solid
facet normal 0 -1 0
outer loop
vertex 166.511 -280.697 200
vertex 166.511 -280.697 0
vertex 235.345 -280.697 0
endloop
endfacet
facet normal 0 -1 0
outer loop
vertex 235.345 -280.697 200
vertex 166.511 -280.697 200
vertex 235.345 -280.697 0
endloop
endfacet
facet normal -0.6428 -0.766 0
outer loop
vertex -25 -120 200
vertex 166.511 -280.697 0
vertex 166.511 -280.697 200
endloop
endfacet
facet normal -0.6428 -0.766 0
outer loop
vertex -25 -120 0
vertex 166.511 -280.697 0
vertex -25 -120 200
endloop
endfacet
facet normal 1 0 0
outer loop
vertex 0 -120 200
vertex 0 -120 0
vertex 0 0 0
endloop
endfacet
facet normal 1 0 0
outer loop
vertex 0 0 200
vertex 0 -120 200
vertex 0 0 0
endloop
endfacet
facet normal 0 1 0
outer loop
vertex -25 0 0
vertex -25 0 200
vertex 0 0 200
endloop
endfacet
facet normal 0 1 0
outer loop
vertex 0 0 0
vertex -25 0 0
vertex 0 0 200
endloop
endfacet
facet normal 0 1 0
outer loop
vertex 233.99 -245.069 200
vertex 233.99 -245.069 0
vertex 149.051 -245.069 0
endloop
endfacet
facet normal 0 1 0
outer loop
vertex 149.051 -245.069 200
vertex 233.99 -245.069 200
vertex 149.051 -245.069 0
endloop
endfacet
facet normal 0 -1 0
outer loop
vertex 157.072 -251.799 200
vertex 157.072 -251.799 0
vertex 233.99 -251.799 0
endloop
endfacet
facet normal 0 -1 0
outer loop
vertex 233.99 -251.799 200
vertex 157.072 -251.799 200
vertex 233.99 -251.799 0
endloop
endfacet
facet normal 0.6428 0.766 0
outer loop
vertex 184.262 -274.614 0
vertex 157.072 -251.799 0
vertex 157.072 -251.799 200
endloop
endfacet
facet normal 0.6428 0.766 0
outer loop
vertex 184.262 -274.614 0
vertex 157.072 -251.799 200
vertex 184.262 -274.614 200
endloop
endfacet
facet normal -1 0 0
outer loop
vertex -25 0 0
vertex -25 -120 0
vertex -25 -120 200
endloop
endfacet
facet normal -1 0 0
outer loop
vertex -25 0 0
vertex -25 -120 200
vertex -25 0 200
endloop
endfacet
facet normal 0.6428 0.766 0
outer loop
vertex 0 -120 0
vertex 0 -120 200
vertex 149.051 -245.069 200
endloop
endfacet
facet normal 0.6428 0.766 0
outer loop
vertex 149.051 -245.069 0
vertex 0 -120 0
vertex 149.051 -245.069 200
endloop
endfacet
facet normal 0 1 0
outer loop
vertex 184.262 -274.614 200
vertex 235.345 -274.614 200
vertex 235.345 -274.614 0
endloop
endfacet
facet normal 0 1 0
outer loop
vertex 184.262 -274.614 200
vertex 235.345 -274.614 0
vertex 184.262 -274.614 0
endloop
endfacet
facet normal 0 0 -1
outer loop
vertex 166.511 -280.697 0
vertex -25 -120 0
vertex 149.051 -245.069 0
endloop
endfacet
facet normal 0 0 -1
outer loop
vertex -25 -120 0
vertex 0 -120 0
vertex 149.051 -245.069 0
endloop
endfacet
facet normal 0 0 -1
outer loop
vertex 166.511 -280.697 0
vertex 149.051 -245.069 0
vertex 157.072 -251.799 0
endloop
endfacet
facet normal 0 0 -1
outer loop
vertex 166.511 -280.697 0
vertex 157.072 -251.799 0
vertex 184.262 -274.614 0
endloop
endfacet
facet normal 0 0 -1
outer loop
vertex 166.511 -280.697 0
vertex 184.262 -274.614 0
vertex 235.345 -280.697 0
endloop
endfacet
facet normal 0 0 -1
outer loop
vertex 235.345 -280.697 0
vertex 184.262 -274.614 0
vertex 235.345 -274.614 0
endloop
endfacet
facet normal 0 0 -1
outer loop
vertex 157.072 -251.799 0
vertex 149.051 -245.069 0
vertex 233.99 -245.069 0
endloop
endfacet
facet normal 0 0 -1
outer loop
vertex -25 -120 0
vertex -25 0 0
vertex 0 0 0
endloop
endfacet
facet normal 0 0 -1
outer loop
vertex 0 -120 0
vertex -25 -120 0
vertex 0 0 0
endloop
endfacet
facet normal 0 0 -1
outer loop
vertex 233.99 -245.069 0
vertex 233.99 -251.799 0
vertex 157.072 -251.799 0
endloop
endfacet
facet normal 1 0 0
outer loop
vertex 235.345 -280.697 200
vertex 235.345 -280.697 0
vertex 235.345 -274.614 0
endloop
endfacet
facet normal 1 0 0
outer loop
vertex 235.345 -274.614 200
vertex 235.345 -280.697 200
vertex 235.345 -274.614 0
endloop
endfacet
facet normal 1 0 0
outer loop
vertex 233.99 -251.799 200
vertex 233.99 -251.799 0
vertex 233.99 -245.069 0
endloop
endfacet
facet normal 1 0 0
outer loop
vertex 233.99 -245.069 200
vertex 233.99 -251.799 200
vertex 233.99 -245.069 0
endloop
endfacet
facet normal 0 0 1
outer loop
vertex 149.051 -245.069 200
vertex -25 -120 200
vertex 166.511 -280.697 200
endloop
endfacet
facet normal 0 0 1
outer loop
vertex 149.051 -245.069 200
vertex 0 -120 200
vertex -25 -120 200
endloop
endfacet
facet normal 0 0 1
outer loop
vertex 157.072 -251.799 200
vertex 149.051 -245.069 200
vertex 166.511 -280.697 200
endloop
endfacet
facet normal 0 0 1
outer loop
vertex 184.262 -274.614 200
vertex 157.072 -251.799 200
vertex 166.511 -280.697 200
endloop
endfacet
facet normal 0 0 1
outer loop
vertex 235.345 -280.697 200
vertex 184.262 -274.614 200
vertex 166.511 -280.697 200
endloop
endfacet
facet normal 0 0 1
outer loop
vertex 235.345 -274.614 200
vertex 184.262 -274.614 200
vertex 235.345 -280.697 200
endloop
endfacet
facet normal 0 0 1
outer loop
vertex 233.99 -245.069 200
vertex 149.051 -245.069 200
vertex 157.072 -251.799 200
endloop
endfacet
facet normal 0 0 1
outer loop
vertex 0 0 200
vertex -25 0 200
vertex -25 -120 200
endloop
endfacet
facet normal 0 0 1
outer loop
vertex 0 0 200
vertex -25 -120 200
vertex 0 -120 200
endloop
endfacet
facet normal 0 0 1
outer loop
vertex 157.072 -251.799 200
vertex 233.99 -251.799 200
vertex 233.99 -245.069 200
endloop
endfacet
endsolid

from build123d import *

# Parameters (mm, degrees)
SKETCH1_W           = 25
SKETCH1_H           = 120
BOSS_EXTRUDE4_DEPTH = 200


with BuildPart() as part:
    # Sketch1 → Boss-Extrude4 (new body)
    with BuildSketch(Plane.XY):
        with Locations((-12.5, -60)):
            Rectangle(SKETCH1_W, SKETCH1_H)
        Polygon((-25, -120), (0, -120), (191.51111078, -280.696902422), (166.51111078, -280.696902422), align=None)
        Polygon((233.990264512, -245.068874008), (149.051279921, -245.068874008), (157.072044946, -251.799094983), (233.990264512, -251.799094983), align=None)
        Polygon((191.51111078, -280.696902422), (235.34462255, -280.696902422), (235.34462255, -274.614068302), (184.261871365, -274.614068302), align=None)
    extrude(amount=BOSS_EXTRUDE4_DEPTH)


solid = part.part
